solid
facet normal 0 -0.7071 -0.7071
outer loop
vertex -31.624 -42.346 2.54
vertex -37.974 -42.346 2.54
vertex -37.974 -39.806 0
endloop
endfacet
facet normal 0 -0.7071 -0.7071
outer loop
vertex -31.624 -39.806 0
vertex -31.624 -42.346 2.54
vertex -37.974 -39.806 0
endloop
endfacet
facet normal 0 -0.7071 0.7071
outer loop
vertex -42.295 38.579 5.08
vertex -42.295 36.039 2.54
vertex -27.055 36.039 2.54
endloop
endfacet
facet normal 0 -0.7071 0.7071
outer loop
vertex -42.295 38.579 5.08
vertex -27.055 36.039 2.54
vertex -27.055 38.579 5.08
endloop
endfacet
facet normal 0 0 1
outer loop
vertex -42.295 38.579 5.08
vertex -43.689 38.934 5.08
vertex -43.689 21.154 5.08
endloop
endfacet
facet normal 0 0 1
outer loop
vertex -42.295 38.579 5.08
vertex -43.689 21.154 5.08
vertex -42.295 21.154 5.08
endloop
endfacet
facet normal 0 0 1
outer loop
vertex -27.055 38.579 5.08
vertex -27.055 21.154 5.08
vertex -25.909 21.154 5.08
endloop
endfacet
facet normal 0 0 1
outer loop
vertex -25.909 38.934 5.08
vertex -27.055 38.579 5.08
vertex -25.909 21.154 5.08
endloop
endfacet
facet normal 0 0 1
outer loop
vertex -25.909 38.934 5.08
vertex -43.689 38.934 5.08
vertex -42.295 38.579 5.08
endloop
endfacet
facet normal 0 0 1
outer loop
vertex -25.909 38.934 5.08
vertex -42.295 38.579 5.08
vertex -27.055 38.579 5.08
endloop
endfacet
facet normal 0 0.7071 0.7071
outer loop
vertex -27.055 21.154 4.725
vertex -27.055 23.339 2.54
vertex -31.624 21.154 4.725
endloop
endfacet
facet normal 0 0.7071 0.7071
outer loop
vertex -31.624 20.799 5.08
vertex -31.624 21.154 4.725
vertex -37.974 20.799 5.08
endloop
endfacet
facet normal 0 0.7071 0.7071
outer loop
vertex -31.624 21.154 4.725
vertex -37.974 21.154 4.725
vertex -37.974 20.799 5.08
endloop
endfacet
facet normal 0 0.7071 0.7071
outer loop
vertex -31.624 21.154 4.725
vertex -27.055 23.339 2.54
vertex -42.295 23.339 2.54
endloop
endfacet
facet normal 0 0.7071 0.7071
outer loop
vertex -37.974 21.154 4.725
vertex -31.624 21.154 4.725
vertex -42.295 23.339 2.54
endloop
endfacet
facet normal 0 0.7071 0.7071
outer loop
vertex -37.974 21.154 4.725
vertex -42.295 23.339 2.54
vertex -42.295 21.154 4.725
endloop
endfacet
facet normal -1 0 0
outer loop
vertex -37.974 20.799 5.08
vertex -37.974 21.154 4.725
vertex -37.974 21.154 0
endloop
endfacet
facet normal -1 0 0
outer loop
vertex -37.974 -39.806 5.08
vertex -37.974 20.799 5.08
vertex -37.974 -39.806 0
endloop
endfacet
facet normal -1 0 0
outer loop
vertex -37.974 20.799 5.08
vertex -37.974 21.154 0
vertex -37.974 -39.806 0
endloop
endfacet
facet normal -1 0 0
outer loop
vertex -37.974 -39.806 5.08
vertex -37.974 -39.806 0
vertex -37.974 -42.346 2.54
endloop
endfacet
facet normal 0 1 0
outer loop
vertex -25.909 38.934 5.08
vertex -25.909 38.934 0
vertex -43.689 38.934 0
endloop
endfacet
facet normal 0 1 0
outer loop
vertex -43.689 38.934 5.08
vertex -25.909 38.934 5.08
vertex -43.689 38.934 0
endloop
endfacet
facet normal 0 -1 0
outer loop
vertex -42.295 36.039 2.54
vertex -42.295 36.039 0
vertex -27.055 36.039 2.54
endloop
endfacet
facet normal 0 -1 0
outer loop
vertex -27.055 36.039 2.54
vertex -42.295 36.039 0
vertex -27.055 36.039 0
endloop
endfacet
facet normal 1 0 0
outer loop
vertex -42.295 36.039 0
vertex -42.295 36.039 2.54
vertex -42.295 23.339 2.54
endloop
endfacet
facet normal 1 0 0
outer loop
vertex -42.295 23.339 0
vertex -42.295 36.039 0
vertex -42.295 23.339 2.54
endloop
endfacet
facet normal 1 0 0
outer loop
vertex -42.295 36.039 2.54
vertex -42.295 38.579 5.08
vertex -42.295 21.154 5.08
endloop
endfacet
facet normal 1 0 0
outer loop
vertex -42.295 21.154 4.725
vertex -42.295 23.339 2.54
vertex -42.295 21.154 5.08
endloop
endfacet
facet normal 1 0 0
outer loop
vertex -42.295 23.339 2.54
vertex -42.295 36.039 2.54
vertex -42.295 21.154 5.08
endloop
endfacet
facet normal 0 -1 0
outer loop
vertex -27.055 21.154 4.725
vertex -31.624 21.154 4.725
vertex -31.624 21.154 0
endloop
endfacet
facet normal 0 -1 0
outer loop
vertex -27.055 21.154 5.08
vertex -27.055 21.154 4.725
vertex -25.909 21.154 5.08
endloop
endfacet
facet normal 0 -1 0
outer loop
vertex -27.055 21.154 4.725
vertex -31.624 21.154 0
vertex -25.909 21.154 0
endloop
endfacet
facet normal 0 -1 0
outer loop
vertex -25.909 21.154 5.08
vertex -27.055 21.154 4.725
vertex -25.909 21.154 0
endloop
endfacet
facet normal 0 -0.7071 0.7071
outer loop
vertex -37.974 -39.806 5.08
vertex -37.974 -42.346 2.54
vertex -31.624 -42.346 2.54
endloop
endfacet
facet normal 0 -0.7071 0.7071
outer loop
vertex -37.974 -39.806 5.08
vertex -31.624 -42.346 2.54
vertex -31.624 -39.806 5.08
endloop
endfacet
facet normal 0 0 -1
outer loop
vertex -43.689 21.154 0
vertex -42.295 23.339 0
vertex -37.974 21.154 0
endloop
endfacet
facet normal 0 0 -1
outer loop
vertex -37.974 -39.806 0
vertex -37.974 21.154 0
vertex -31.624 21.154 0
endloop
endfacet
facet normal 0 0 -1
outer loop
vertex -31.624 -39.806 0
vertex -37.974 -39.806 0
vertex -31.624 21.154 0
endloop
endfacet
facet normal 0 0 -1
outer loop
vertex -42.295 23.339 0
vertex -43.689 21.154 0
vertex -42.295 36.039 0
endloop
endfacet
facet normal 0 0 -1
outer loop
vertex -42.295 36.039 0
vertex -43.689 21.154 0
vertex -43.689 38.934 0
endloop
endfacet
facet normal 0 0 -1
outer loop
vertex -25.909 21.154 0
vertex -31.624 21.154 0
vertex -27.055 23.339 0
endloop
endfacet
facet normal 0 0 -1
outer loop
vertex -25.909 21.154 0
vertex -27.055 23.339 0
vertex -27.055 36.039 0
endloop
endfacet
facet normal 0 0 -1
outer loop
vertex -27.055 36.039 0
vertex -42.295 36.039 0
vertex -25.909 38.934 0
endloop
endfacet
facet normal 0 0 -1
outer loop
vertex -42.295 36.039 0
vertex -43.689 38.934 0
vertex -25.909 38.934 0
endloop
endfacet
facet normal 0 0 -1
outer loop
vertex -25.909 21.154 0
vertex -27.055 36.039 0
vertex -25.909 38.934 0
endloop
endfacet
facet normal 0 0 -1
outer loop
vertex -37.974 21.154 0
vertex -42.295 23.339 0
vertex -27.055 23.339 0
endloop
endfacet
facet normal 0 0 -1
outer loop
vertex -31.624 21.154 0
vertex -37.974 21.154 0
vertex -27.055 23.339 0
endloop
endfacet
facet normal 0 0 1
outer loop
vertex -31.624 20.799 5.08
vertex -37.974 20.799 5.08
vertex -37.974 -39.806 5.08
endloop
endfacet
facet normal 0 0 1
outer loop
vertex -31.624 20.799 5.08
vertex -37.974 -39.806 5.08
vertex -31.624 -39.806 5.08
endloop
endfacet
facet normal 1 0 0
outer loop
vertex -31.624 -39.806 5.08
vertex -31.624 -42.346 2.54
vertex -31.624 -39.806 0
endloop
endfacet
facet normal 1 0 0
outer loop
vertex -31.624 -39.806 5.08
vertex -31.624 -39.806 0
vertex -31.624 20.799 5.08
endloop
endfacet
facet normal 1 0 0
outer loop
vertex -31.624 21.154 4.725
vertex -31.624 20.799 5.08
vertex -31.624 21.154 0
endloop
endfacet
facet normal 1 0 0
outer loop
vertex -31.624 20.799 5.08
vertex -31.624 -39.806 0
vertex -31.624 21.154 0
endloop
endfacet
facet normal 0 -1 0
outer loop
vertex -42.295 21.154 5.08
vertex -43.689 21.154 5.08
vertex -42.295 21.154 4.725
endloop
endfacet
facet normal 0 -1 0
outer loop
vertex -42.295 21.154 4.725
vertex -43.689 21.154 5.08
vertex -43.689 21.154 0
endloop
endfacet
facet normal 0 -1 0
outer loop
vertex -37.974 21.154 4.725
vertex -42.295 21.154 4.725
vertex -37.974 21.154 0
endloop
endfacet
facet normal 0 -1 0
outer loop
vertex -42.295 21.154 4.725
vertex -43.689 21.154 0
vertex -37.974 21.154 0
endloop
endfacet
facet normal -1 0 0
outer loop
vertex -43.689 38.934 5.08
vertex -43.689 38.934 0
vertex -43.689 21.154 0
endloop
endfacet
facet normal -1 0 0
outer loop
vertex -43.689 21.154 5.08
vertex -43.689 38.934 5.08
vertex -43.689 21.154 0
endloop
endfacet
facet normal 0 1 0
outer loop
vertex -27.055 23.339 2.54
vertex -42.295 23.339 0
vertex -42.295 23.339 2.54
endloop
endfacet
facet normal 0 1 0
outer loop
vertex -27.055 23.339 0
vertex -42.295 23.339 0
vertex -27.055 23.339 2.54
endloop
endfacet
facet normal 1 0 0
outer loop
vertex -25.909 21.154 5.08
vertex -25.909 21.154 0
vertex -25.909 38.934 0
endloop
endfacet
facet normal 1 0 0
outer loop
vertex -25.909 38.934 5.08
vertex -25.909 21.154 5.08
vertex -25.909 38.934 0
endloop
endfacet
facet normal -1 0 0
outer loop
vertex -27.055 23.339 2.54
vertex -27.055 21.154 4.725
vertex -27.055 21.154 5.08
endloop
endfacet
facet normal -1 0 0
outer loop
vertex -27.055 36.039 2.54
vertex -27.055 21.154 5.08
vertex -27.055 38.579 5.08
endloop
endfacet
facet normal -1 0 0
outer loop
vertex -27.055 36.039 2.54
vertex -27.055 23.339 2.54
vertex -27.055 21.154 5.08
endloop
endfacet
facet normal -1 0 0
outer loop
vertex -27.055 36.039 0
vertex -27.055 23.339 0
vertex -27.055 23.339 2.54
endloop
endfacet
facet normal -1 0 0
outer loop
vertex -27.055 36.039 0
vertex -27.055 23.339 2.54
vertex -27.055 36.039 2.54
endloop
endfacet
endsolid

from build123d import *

# Parameters (mm, degrees)
F0_W        = 15.24
F0_H        = 12.7
F1_DEPTH    = 5.08
F2_T1_DEPTH = 15.24
F2_T3_DEPTH = 19.4141495789


# Not quite as in the source:
# - a fillet or chamfer that OpenCascade refuses, or shapes differently, is made with other operations: its cross-section is extruded or revolved along the edge and cut away or added
# - a feature names something its author has since deleted; it is built from what else it names


with BuildPart() as f1:
    # F0 (on Top) → F1 (new body)
    with BuildSketch(Plane.XY):
        Polygon((-43.6893899012, 21.153706044), (-37.9743899012, 21.153706044), (-34.7993899012, 21.153706044), (-31.6243899012, 21.153706044), (-25.9093899012, 21.153706044), (-25.9093899012, 38.933706044), (-43.6893899012, 38.933706044), align=None)
        with Locations((-34.6747071493, 29.6888263732)):
            Rectangle(F0_W, F0_H, mode=Mode.SUBTRACT)
        Polygon((-34.7993899012, 21.153706044), (-37.9743899012, 21.153706044), (-37.9743899012, -42.346293956), (-31.6243899012, -42.346293956), (-31.6243899012, 21.153706044), align=None)
    extrude(amount=F1_DEPTH)

    # F2: chamfer of 2.54 on 4 edges, made by hand

    # F2_s2 → F2_t1 (cut)
    with BuildSketch(Plane.YZ.offset(-42.2947071493)):
        Polygon((36.0388263732, 2.54), (38.5788263732, 5.08), (36.0388263732, 5.08), align=None)
        Polygon((23.3388263732, 2.54), (20.7988263732, 5.08), (23.3388263732, 5.08), align=None)
    extrude(amount=F2_T1_DEPTH, mode=Mode.SUBTRACT)

    # F2_s4 → F2_t3 (cut)
    with BuildSketch(Plane.YZ.offset(-44.5064646906)):
        Polygon((-42.346293956, 2.54), (-39.806293956, 5.08), (-42.346293956, 5.08), align=None)
        Polygon((-42.346293956, 2.54), (-39.806293956, 0), (-42.346293956, 0), align=None)
    extrude(amount=F2_T3_DEPTH, mode=Mode.SUBTRACT)


solid = f1.part
